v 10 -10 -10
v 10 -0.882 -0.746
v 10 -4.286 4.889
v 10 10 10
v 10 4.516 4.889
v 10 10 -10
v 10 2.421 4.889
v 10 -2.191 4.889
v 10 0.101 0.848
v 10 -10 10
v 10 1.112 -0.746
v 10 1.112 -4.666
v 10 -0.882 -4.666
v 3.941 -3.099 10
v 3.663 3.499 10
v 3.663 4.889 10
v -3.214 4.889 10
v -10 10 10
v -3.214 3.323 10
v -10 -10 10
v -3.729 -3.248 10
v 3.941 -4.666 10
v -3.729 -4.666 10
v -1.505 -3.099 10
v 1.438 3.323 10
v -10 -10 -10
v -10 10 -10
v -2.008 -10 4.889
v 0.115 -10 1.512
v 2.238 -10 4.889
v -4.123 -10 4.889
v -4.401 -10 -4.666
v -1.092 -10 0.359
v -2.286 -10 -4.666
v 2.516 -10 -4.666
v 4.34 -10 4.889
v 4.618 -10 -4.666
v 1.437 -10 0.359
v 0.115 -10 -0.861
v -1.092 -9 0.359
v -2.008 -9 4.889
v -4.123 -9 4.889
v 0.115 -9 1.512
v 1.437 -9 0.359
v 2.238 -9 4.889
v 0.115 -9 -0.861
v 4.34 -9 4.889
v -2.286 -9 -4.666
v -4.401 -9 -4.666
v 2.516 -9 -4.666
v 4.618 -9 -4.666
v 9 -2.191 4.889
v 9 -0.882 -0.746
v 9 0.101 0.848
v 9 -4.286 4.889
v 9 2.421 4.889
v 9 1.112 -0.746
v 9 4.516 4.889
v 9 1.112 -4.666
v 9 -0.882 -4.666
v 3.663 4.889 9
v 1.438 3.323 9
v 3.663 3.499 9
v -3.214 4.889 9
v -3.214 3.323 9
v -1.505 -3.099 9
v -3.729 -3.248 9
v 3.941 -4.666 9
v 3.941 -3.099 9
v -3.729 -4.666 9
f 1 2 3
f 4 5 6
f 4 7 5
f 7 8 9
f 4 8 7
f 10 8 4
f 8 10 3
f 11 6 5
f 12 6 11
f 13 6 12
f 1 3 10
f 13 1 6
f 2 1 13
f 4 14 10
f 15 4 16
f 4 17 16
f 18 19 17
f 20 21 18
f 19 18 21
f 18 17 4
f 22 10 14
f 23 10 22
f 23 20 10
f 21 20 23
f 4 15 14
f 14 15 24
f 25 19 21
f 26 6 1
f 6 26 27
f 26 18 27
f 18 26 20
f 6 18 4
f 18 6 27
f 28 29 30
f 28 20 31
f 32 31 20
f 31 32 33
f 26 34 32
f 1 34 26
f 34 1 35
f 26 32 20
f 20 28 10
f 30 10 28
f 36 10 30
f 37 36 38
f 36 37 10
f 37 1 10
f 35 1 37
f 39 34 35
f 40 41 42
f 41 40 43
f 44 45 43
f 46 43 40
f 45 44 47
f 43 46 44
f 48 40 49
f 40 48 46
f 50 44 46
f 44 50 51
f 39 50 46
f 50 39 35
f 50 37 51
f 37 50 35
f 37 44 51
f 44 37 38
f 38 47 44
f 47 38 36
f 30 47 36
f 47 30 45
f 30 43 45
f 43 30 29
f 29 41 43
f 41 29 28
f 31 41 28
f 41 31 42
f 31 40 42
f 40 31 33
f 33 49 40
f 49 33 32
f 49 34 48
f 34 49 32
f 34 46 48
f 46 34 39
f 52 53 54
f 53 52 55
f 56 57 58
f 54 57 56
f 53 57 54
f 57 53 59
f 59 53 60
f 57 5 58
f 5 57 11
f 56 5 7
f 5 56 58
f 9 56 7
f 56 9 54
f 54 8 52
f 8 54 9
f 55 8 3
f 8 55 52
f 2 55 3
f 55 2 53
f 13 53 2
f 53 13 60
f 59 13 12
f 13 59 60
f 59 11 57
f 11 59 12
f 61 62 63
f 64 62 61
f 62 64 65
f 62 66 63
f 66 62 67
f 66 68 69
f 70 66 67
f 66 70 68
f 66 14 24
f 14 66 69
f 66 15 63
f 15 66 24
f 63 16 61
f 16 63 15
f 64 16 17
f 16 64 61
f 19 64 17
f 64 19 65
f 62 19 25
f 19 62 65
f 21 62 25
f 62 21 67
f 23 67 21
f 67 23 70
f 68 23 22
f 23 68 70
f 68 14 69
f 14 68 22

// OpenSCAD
// Calibration cube 20x20
font = "Arial:style=Bold";

$fn=100;

cube_size = 20;
letter_size = 0.5*cube_size;
letter_height = 0.2*letter_size;

o = cube_size / 2 - letter_height / 2;

module letter(Txt) {
  color("Yellow")
  linear_extrude(height = letter_height) {
    text(Txt, size = letter_size, font = font, halign = "center", valign = "center");
  }
}

difference() {
  color("gray") 
  cube(cube_size, center = true);
  translate([0, -o, 0]) rotate([90, 0, 0]) letter("X");
  translate([o, 0, 0]) rotate([90, 0, 90]) letter("Y");
  translate([0, 0, o])  letter("Z");
}
